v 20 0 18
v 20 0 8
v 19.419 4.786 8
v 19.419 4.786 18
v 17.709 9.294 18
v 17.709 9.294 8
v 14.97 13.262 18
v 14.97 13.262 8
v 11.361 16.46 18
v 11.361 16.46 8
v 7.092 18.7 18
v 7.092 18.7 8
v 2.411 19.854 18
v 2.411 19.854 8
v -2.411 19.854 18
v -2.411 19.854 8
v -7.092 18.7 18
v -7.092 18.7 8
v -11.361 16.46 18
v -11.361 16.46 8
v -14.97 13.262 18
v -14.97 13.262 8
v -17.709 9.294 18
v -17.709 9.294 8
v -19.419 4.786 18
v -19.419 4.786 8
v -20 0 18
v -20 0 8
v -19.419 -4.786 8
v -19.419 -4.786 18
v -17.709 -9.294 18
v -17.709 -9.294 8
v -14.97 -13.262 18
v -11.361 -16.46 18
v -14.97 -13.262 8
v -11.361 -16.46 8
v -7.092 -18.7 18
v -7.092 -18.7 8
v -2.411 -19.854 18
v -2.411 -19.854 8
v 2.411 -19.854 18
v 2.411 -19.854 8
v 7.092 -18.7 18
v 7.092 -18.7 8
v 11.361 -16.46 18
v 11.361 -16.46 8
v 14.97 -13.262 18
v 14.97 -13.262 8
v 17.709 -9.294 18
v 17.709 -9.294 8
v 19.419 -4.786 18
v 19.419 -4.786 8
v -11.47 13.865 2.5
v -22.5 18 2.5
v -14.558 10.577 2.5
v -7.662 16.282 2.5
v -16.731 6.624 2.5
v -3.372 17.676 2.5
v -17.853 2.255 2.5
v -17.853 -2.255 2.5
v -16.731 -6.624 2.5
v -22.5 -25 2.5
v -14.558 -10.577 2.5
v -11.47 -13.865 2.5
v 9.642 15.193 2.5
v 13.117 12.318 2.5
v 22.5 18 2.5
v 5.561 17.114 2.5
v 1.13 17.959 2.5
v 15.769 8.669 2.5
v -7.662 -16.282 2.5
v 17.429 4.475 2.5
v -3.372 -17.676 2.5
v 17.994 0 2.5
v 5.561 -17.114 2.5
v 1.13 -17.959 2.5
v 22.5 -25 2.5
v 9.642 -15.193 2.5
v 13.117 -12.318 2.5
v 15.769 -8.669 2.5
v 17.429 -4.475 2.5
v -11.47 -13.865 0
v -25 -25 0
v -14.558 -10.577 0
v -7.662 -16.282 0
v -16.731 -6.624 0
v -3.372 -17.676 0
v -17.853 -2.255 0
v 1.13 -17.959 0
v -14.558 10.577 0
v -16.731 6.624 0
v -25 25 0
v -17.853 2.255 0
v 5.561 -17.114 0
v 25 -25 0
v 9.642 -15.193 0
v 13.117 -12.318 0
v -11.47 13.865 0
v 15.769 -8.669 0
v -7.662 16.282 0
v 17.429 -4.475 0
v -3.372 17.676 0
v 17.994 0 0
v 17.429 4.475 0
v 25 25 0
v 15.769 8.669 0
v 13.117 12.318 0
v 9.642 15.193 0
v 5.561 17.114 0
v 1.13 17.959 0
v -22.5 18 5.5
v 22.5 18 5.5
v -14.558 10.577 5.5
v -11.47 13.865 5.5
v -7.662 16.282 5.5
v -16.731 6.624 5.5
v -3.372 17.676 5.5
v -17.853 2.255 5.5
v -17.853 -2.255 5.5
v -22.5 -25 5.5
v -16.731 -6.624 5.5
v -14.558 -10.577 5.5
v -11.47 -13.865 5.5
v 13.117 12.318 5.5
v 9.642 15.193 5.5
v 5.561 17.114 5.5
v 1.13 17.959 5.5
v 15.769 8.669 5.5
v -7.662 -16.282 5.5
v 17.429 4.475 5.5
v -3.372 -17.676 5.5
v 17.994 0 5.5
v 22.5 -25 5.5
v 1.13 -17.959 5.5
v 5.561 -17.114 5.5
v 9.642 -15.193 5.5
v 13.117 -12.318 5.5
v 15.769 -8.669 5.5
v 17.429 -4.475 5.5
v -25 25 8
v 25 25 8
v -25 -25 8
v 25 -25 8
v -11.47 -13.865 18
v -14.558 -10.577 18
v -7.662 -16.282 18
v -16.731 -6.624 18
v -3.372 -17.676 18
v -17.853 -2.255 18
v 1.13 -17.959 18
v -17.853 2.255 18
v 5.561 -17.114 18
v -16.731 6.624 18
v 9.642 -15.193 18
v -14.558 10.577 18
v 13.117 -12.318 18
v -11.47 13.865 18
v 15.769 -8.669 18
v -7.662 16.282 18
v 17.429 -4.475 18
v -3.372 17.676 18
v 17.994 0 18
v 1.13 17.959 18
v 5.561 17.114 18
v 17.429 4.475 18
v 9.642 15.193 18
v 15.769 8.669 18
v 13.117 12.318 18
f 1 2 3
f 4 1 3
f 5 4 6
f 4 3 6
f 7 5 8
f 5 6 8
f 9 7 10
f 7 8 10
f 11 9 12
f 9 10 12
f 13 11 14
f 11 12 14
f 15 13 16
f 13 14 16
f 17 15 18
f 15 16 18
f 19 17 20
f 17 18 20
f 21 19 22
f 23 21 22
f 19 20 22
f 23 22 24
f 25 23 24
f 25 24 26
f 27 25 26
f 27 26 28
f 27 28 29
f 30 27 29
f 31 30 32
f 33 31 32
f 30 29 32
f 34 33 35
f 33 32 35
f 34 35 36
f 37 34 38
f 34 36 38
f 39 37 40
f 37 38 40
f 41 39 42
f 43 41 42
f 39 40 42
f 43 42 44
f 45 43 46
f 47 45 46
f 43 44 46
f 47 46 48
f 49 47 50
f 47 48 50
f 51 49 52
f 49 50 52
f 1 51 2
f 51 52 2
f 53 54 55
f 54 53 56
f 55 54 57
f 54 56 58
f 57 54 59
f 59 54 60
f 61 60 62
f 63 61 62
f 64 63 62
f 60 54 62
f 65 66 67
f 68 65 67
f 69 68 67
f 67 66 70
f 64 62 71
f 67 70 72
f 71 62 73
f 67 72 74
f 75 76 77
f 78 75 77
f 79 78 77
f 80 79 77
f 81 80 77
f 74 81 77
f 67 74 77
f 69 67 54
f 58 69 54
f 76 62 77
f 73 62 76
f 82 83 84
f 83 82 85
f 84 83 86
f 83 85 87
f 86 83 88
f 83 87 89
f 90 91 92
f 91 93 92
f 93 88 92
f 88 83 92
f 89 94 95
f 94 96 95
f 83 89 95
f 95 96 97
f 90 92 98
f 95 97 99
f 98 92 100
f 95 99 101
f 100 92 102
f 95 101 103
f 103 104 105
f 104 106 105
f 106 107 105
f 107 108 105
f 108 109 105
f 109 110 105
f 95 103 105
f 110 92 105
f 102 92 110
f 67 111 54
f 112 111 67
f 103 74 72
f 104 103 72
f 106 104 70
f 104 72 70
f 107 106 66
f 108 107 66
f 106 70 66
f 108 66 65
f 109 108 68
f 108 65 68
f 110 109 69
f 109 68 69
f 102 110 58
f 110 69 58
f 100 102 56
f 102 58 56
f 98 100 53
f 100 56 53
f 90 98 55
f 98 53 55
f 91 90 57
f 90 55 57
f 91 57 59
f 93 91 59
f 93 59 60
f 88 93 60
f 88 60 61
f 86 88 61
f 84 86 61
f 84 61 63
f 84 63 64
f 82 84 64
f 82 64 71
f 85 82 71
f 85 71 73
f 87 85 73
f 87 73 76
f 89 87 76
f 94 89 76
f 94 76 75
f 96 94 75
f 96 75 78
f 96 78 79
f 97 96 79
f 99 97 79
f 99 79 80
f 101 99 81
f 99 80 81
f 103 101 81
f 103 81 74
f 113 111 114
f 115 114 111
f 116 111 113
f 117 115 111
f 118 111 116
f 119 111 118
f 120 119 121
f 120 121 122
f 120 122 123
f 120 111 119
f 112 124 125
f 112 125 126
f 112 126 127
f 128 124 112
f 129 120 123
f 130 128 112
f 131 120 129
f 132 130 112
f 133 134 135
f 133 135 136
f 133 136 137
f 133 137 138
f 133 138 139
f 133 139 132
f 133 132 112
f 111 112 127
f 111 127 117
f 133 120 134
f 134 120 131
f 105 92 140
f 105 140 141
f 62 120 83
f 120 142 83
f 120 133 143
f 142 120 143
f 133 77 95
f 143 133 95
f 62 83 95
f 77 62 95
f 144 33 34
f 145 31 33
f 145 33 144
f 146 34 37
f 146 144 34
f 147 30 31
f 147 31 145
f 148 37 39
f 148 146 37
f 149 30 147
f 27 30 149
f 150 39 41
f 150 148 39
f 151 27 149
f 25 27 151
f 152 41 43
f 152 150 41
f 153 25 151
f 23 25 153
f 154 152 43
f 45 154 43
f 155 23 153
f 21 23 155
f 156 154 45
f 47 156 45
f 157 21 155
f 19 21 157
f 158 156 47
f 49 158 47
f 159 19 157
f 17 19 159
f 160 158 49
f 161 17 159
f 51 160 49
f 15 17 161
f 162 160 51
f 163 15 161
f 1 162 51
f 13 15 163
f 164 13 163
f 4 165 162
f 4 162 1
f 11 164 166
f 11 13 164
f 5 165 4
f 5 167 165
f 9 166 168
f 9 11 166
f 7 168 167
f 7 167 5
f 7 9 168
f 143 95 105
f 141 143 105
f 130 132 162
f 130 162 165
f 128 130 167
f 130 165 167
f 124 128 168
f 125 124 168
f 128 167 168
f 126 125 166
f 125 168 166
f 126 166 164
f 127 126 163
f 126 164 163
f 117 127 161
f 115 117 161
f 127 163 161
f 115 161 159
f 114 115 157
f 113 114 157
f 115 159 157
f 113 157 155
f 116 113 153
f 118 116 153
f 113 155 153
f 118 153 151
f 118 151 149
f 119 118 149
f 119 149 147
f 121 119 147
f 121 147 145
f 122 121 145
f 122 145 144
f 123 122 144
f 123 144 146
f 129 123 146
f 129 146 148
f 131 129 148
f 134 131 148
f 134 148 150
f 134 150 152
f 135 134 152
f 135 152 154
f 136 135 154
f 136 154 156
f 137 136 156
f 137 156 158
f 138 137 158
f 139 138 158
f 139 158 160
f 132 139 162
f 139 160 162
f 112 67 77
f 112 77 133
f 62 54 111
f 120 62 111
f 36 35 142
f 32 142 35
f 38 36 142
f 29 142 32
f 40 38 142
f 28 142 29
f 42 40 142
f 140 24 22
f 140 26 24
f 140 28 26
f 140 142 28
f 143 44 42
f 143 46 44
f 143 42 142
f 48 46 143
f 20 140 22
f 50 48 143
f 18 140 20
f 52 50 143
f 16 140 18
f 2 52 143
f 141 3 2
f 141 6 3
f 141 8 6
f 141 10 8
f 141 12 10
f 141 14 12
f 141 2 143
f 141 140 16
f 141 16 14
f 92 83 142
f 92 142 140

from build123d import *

# Parameters (mm, degrees)
SKETCH_W        = 50
SKETCH_H        = 50
PAD_DEPTH       = 8
SKETCH001_R     = 20
PAD001_DEPTH    = 10
SKETCH002_R     = 17.994409
POCKET_DEPTH    = 18.001
SKETCH003_W     = 45
SKETCH003_H     = 3
POCKET001_DEPTH = 43


with BuildPart() as part:
    # Sketch → Pad (new body)
    with BuildSketch(Plane.XY):
        Rectangle(SKETCH_W, SKETCH_H)
    extrude(amount=PAD_DEPTH)

    # Sketch001 → Pad001 (new body)
    with BuildSketch(Plane.XY.offset(8)):
        Circle(SKETCH001_R)
    extrude(amount=PAD001_DEPTH)

    # Sketch002 → Pocket (cut, through all)
    with BuildSketch(Plane.XY.offset(18)):
        Circle(SKETCH002_R)
    extrude(amount=-POCKET_DEPTH, mode=Mode.SUBTRACT)

    # Sketch003 → Pocket001 (cut)
    with BuildSketch(Plane.XZ.offset(25)):
        with Locations((0, 4)):
            Rectangle(SKETCH003_W, SKETCH003_H)
    extrude(amount=-POCKET001_DEPTH, mode=Mode.SUBTRACT)


solid = part.part
